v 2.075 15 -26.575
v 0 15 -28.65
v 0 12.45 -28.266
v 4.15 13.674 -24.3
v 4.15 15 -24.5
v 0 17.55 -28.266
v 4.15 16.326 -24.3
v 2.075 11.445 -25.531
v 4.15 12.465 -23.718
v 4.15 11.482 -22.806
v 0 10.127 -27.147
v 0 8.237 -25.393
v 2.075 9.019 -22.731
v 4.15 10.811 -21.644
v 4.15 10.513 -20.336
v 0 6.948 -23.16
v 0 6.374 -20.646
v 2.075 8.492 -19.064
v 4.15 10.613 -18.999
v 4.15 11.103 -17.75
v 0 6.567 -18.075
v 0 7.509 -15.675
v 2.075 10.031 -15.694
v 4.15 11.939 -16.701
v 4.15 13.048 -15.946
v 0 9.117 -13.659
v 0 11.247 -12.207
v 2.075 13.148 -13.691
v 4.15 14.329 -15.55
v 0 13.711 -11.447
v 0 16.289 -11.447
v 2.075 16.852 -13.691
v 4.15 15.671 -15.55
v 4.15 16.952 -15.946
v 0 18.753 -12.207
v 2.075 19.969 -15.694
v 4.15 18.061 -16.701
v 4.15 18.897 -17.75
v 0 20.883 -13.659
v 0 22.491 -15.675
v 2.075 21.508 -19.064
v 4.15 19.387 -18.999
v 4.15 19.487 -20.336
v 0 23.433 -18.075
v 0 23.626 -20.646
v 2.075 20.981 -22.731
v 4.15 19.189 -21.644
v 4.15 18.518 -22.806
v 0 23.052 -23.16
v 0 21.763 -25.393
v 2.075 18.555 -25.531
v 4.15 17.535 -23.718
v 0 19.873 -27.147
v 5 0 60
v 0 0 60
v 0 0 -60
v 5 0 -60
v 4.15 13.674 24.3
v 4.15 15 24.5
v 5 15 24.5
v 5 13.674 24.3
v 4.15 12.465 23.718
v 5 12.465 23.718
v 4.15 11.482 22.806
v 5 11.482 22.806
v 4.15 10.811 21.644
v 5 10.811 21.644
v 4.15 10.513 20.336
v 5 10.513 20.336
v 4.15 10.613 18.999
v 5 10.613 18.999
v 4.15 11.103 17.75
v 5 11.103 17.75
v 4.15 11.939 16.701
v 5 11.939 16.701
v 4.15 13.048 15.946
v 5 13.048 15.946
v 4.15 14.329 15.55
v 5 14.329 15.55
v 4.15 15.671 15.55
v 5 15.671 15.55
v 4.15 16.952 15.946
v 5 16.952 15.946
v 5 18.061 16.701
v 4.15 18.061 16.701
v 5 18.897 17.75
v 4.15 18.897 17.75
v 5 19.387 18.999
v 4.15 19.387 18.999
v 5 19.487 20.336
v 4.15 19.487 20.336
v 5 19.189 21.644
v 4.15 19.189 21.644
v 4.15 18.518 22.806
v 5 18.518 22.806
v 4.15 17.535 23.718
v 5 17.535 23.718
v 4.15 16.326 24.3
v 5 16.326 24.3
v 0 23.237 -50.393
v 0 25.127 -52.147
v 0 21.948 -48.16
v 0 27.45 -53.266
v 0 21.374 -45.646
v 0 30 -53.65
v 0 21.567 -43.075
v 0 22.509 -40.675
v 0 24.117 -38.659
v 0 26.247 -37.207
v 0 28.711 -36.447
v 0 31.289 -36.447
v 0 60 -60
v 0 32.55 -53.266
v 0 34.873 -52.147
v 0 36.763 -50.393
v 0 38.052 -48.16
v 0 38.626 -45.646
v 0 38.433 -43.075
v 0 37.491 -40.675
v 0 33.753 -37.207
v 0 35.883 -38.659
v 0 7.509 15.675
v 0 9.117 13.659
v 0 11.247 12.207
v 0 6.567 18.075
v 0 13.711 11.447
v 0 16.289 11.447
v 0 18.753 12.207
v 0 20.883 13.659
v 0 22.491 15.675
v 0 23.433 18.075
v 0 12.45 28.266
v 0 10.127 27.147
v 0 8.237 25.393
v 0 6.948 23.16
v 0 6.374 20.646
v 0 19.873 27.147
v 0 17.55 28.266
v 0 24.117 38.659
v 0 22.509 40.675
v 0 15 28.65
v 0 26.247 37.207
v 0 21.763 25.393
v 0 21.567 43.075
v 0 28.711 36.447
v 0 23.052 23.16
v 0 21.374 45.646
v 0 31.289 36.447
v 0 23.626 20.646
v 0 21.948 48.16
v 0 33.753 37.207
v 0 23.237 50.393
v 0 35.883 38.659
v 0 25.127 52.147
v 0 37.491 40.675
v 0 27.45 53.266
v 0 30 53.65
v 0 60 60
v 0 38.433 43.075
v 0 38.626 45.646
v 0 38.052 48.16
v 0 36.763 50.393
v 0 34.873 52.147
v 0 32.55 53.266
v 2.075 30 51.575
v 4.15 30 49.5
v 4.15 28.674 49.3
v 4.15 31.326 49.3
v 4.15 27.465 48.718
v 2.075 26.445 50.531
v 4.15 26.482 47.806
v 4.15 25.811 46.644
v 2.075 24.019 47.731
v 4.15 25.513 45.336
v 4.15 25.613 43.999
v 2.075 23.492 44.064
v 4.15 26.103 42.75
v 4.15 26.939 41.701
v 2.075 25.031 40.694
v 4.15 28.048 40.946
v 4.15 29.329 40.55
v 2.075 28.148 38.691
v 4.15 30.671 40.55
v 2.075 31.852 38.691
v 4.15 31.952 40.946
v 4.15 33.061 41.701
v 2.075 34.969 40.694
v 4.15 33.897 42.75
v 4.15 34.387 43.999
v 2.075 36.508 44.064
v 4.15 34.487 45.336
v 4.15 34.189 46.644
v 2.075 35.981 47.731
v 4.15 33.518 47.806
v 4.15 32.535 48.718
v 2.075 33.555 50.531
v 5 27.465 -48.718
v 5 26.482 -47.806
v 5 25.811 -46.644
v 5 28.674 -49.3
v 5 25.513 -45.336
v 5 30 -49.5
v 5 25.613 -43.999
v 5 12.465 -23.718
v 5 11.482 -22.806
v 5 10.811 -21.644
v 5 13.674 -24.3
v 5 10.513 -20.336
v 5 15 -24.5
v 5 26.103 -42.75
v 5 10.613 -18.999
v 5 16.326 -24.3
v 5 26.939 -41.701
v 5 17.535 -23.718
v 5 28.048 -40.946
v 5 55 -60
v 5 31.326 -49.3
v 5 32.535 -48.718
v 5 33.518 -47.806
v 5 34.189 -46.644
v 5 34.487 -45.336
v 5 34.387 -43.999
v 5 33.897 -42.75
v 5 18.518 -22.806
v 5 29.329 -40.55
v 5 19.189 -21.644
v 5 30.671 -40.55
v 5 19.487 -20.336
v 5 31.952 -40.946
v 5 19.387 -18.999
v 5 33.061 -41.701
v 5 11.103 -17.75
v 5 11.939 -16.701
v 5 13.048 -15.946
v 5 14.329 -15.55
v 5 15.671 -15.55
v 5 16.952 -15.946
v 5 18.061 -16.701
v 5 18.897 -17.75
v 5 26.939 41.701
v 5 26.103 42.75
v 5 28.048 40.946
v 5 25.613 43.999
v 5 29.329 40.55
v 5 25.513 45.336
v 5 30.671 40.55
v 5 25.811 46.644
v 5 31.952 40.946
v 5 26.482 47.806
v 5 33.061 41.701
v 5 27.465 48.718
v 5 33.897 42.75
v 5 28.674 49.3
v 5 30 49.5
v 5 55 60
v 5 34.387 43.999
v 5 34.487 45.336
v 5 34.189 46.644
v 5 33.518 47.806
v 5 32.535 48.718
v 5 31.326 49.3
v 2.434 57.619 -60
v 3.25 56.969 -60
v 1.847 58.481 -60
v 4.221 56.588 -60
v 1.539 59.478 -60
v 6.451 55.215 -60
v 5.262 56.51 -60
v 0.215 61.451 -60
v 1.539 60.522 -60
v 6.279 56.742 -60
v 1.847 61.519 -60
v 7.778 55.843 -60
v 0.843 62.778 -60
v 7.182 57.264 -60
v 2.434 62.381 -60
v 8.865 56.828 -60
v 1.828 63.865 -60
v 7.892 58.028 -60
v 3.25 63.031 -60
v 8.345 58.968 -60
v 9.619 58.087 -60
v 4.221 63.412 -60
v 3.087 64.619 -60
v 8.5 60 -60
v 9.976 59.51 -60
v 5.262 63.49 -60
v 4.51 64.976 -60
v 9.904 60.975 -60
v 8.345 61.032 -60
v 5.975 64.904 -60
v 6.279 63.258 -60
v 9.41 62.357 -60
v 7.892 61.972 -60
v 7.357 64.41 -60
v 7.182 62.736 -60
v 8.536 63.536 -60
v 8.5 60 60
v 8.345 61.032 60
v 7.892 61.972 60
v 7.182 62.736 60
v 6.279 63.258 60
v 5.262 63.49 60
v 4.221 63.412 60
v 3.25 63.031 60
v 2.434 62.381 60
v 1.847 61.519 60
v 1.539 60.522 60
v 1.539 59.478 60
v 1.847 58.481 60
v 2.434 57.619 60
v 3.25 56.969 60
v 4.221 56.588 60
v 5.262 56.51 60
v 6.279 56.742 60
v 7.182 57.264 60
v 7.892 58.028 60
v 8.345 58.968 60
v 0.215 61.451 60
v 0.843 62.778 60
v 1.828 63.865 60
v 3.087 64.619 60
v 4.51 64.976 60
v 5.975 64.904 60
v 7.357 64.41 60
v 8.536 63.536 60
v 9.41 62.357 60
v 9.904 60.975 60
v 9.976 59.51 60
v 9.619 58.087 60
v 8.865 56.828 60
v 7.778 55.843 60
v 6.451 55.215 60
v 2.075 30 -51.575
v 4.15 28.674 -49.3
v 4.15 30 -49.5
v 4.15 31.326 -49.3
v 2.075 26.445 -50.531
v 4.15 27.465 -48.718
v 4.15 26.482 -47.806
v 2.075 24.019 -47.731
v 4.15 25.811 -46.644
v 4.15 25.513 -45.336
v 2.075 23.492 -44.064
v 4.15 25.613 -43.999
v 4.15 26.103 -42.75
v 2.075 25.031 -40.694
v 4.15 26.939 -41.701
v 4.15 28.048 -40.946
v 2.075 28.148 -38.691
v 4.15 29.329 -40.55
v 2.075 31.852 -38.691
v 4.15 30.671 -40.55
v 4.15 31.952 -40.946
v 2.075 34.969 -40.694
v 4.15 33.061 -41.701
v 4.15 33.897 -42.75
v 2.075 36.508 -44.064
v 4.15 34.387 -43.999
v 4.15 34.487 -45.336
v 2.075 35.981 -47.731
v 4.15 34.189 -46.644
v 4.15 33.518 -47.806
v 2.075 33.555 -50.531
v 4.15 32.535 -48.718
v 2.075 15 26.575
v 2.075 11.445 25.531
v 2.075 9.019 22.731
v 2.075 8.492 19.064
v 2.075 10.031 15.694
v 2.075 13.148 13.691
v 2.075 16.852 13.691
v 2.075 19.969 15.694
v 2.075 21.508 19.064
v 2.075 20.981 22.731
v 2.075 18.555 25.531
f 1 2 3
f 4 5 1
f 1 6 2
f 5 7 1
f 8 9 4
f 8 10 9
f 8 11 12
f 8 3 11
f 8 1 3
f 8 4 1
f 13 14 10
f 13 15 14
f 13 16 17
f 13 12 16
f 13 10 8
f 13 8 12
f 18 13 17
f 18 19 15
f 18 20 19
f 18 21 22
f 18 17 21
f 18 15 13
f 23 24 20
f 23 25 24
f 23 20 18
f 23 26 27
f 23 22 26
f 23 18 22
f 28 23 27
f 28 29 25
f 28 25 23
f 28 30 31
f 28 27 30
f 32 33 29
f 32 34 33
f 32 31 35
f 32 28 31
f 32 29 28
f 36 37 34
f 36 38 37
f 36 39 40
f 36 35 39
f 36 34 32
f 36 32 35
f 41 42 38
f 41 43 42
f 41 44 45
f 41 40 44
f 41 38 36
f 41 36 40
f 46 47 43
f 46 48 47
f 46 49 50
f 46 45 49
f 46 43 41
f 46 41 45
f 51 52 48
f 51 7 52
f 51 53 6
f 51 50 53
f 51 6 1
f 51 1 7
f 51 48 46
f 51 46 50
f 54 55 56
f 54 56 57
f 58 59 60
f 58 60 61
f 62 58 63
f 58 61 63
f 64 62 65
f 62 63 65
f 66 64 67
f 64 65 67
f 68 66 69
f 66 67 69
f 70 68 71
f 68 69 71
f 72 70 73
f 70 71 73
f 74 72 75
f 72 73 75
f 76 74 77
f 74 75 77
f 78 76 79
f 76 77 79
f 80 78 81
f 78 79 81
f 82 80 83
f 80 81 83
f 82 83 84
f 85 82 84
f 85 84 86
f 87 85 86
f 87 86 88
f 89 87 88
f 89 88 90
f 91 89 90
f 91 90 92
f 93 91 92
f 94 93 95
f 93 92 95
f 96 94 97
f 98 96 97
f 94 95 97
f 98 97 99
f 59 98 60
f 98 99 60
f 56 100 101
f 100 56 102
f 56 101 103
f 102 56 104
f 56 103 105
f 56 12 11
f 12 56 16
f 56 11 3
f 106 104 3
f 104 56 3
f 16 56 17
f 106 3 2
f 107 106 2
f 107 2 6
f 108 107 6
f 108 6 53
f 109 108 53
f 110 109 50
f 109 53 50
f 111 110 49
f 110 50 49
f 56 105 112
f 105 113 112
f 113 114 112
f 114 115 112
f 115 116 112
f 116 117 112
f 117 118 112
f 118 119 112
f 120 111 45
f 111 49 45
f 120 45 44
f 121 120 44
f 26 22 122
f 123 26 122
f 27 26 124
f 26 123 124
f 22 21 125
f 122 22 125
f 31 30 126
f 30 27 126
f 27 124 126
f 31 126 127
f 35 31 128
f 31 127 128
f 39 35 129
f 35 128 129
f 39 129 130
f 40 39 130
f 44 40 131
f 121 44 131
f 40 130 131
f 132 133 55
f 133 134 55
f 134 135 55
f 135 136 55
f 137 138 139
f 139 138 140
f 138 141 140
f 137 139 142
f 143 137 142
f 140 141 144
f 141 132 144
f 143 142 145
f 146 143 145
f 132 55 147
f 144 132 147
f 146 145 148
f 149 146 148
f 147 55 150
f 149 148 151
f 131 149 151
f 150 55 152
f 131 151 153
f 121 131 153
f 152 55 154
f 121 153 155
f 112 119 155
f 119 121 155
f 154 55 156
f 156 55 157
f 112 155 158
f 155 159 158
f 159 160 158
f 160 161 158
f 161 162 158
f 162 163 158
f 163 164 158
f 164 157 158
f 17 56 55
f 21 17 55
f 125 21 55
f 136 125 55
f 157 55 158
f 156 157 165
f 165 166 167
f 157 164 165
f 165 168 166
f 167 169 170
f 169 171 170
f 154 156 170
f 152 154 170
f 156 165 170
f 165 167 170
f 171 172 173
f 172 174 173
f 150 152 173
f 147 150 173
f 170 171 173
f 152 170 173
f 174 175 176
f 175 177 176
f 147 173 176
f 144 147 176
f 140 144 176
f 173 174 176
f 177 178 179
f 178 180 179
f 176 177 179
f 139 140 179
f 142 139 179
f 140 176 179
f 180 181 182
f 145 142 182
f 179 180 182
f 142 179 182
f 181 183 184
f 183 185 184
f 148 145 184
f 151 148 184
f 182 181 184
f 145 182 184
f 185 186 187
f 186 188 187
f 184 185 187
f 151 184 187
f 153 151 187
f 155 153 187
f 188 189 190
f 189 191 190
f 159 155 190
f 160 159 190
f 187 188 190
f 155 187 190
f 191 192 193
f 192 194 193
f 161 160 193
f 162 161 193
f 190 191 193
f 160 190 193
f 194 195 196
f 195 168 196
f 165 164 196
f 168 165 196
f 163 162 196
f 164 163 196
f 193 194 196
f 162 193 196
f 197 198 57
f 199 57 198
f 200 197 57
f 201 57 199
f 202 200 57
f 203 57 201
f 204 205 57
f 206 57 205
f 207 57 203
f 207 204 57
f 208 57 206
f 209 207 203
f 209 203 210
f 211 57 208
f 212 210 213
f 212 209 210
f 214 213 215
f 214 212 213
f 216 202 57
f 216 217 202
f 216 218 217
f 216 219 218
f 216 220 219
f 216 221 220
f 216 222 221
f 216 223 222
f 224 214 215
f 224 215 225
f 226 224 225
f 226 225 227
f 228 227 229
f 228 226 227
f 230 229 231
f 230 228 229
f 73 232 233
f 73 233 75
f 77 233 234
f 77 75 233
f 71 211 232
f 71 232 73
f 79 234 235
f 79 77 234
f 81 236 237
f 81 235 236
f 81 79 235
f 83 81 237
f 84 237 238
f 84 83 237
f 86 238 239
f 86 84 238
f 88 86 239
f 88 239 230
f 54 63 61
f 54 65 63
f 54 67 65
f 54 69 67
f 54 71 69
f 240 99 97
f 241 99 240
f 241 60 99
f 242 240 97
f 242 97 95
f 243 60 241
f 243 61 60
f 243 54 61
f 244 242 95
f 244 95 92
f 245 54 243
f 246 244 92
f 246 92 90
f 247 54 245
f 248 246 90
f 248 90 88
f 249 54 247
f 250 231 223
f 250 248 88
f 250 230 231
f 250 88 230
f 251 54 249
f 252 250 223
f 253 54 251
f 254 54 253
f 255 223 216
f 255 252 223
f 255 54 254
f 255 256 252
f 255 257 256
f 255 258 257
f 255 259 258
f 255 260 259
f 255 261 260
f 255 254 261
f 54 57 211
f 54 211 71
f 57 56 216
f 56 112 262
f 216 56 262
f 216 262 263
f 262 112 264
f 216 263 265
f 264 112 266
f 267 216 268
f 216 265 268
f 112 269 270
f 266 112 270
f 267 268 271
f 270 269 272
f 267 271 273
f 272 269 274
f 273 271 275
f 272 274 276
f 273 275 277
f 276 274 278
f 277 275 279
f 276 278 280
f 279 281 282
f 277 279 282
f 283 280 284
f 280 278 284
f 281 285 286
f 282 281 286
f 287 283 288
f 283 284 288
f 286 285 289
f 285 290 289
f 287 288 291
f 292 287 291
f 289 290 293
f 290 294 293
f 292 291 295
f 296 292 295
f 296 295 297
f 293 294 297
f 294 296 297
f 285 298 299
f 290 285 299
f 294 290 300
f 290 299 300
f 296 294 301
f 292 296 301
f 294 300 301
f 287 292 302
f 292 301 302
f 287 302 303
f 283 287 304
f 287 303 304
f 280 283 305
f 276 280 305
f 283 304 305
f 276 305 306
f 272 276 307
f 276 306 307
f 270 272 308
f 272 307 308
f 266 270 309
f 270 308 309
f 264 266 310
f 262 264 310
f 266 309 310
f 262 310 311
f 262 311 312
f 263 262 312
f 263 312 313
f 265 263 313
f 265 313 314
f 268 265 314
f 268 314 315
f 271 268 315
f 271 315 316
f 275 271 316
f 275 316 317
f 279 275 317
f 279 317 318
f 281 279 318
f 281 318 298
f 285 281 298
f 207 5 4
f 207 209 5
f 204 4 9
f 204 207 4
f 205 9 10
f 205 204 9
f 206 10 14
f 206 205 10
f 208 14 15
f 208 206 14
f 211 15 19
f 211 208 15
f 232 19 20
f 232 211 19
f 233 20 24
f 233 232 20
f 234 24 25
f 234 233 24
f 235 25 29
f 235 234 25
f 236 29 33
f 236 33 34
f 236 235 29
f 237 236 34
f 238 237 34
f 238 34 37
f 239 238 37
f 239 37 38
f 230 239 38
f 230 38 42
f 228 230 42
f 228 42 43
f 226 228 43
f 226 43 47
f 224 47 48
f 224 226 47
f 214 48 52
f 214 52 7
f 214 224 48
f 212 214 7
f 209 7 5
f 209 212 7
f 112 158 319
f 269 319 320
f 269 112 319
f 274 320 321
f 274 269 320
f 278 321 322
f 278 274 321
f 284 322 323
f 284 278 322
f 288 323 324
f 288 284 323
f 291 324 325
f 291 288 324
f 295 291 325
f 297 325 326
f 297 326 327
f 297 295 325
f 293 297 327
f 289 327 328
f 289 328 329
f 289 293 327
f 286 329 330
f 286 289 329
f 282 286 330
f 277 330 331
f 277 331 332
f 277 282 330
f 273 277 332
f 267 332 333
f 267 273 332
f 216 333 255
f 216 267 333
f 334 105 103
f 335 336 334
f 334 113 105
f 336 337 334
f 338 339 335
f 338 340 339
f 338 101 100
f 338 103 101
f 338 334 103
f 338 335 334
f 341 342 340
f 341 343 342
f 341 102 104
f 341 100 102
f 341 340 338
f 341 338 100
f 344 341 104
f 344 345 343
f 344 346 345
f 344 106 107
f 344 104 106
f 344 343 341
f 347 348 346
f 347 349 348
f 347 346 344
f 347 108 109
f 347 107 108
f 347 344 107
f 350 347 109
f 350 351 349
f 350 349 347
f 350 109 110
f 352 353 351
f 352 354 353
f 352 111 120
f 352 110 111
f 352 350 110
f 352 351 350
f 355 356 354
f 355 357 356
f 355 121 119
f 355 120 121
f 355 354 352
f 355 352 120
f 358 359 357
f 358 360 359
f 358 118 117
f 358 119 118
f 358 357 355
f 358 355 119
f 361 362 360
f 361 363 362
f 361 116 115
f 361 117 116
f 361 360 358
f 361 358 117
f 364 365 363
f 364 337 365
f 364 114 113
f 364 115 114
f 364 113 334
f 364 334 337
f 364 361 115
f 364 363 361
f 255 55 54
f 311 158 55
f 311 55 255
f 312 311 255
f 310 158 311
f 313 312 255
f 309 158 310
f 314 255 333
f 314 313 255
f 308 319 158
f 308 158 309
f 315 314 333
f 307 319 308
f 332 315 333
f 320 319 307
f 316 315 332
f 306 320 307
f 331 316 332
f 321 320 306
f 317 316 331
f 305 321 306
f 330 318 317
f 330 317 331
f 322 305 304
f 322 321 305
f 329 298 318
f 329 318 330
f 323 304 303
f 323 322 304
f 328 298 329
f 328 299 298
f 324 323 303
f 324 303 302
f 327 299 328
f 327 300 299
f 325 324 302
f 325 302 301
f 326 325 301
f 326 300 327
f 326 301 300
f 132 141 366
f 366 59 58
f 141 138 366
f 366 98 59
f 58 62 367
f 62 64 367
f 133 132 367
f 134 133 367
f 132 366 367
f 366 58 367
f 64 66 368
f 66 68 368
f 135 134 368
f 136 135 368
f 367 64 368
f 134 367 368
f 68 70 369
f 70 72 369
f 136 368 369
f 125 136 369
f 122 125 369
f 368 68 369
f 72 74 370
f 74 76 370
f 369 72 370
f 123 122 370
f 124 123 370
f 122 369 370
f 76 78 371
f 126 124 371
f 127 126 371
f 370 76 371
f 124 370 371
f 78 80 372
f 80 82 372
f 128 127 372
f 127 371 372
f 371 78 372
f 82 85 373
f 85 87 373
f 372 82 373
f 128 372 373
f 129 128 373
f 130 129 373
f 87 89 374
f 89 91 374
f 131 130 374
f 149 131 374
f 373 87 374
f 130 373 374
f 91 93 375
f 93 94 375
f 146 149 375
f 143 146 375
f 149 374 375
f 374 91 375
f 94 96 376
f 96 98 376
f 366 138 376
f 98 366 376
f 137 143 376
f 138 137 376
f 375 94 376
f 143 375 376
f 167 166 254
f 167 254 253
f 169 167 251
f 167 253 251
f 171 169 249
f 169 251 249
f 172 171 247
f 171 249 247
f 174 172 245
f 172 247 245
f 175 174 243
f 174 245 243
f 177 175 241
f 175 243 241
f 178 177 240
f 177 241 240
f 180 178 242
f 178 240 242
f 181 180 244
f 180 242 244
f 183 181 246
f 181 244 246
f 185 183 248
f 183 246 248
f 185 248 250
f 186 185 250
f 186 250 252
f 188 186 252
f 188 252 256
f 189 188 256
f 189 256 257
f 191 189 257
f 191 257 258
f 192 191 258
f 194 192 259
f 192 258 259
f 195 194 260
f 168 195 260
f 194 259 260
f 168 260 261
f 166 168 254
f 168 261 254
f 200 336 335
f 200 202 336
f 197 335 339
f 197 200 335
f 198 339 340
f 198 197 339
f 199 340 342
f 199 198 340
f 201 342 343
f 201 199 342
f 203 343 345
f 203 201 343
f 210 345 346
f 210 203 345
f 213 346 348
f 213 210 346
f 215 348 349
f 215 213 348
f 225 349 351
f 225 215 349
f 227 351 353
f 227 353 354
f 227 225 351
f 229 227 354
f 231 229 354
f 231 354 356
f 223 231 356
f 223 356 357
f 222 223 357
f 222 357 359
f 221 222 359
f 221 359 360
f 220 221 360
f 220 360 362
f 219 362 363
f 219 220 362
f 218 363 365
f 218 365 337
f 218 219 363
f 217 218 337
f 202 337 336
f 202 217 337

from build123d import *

# Parameters (mm, degrees)
SKETCH_1_W                  = 5
SKETCH_1_H                  = 60
EXTRUDE_2_DEPTH             = 60
SKETCH_2_R                  = 5
SKETCH_3_R                  = 3.5
CUT_EXTRUDE_1_DEPTH         = 137.839321834
HOLE_WIZARD_M81_D           = 9
HOLE_WIZARD_M81_CSINK_D     = 17.3
HOLE_WIZARD_M81_CSINK_ANGLE = 90


with BuildPart() as part:
    # Эскиз1 → Вытянуть-Тонкостенный2 (new, symmetric)
    with BuildSketch(Plane.XY):
        with Locations((2.5, 30)):
            Rectangle(SKETCH_1_W, SKETCH_1_H)
    extrude(amount=EXTRUDE_2_DEPTH, both=True)

    # По траектории1: sweep along a curve in space
    with BuildLine() as sweep_1_path:
        Line((0, 60, 60), (0, 60, -60))
    # Эскиз2 → По траектории1 (sweep)
    with BuildSketch(Plane.XY.offset(60)):
        with Locations((5, 60)):
            Circle(SKETCH_2_R)
    sweep(path=sweep_1_path.line)

    # Эскиз3 → Вырез-Вытянуть1 (cut, through all)
    with BuildSketch(Plane.XY.offset(60)):
        with Locations((5, 60)):
            Circle(SKETCH_3_R)
    extrude(amount=-CUT_EXTRUDE_1_DEPTH, mode=Mode.SUBTRACT)

    # Зенковка для  винта с плоской головкой M81 (through all)
    with Locations(Plane(origin=(0, 0, 0), x_dir=(0, 0, -1), z_dir=(-1, 0, 0))):
        with Locations((-45, -30), (-20, -15)):
            hole_wizard_m81 = CounterSinkHole(HOLE_WIZARD_M81_D / 2, HOLE_WIZARD_M81_CSINK_D / 2, counter_sink_angle=HOLE_WIZARD_M81_CSINK_ANGLE)

    # Зеркальное отражение4: Зенковка для  винта с плоской головкой M81 across plane
    add(hole_wizard_m81.mirror(Plane.XY), mode=Mode.SUBTRACT)


solid = part.part
